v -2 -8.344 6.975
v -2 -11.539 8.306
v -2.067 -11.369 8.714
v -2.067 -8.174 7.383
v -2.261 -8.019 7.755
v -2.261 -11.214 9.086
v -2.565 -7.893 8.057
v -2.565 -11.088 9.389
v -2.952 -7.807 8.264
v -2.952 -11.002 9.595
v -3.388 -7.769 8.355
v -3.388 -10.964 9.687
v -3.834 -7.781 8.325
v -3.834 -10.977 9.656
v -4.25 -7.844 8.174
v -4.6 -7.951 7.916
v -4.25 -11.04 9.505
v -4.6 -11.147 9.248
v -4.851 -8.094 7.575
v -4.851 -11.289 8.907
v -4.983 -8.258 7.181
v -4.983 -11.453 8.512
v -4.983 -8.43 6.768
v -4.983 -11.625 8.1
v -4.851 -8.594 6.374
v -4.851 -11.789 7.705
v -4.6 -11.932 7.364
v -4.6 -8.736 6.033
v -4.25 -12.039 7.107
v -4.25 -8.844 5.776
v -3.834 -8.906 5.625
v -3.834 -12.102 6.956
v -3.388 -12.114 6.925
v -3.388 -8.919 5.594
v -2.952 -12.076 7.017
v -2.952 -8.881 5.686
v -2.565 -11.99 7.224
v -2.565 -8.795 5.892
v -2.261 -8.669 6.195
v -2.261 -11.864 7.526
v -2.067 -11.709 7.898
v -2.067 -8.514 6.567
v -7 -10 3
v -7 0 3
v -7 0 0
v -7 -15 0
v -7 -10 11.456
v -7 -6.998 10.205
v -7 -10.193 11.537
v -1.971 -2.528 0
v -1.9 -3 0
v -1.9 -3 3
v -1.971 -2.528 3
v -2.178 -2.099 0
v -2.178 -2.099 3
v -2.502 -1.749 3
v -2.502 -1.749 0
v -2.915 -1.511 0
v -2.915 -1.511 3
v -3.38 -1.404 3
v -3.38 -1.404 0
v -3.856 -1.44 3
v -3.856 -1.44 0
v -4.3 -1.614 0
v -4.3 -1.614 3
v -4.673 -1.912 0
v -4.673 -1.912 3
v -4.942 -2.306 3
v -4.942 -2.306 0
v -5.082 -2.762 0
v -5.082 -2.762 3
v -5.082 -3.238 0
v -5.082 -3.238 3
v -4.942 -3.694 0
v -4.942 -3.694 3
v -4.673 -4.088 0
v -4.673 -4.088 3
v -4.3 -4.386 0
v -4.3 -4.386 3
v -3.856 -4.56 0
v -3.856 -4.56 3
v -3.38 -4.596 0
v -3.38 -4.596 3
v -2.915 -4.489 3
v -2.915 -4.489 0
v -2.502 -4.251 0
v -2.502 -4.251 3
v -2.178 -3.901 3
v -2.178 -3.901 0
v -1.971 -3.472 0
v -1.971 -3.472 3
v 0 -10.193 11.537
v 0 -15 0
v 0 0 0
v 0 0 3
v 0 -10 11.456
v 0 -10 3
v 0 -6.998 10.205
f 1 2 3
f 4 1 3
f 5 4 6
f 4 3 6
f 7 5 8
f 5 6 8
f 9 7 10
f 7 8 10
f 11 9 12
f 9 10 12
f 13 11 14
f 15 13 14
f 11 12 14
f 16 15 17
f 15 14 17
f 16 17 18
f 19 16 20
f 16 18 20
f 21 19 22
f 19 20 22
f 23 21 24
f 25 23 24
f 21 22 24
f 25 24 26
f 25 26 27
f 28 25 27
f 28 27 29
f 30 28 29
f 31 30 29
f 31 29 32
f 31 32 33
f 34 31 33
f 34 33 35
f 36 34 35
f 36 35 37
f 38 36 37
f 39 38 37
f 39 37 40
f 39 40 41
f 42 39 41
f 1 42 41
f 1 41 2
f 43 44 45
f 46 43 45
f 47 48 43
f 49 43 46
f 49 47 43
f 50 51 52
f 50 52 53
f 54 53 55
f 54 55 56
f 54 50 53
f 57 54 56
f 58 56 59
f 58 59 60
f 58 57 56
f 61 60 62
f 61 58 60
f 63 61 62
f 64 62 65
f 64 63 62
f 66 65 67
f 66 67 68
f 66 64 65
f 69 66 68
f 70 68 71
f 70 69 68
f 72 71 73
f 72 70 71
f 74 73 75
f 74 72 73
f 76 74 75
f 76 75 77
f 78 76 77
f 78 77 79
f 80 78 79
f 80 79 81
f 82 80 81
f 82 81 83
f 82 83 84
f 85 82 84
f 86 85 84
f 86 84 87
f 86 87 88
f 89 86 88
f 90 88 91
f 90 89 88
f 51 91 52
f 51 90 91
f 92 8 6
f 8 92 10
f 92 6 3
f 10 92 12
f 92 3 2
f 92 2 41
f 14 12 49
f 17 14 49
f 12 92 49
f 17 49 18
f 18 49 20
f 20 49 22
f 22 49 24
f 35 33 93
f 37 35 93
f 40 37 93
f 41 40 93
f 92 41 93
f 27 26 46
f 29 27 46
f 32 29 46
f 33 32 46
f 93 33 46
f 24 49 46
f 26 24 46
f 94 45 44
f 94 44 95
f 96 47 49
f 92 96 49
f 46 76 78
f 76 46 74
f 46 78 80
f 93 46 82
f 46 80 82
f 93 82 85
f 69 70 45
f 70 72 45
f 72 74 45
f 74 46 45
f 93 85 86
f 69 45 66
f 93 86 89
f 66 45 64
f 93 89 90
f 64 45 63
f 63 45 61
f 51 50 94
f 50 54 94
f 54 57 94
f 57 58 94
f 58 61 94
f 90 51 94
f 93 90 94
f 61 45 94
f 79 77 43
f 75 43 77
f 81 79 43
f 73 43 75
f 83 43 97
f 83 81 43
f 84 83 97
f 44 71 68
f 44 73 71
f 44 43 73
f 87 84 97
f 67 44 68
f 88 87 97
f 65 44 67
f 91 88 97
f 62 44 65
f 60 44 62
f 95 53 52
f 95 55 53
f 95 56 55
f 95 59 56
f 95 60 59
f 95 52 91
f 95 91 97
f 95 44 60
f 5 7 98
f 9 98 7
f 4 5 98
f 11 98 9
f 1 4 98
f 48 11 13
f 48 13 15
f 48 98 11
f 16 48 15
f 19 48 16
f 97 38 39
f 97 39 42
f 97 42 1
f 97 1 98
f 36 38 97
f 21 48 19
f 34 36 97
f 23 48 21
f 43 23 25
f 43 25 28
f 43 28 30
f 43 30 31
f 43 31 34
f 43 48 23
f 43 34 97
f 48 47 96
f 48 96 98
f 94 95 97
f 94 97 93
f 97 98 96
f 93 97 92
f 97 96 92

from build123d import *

# Parameters (mm, degrees)
F0_W     = 7
F0_H     = 10
F0_R     = 1.6
F1_DEPTH = 3
F0_H_2   = 5
F2_DEPTH = 12
F4_DEPTH = 25
F5_DEPTH = 7
F6_R     = 1.5
F7_DEPTH = 10


with BuildPart() as f1:
    # F0 (on Top) → F1 (new body)
    with BuildSketch(Plane.XY):
        with Locations((-3.5, -5)):
            Rectangle(F0_W, F0_H)
        with Locations((-3.5, -3)):
            Circle(F0_R, mode=Mode.SUBTRACT)
    extrude(amount=F1_DEPTH)

    # F0 (on Top) → F2 (join)
    with BuildSketch(Plane.XY):
        with Locations((-3.5, -12.5)):
            Rectangle(F0_W, F0_H_2)
    extrude(amount=F2_DEPTH)

    # F3 (on face) → F4 (cut)
    with BuildSketch(Plane(origin=(-7, 0, 0), x_dir=(0, -1, 0), z_dir=(-1, 0, 0))):
        Polygon((10.1929933606, 11.5368159345), (15, 0), (15, 12), (10, 12), align=None)
        Polygon((10, 11.4564020342), (10.1929933606, 11.5368159345), (10, 12), align=None)
    extrude(amount=-F4_DEPTH, mode=Mode.SUBTRACT)

    # F3 (on face) → F5 (join)
    with BuildSketch(Plane(origin=(-7, 0, 0), x_dir=(0, -1, 0), z_dir=(-1, 0, 0))):
        Polygon((10, 3), (10, 11.4564020342), (6.9977270885, 10.2054549877), align=None)
    extrude(amount=-F5_DEPTH)

    # F6 (on face) → F7 (cut)
    with BuildSketch(Plane(origin=(0, -12.7810650888, 5.325443787), x_dir=(1, 0, 0), z_dir=(0, -0.9230769231, 0.3846153846))):
        with Locations((-3.5, 3.2289864931)):
            Circle(F6_R)
    extrude(amount=-F7_DEPTH, mode=Mode.SUBTRACT)


solid = f1.part
